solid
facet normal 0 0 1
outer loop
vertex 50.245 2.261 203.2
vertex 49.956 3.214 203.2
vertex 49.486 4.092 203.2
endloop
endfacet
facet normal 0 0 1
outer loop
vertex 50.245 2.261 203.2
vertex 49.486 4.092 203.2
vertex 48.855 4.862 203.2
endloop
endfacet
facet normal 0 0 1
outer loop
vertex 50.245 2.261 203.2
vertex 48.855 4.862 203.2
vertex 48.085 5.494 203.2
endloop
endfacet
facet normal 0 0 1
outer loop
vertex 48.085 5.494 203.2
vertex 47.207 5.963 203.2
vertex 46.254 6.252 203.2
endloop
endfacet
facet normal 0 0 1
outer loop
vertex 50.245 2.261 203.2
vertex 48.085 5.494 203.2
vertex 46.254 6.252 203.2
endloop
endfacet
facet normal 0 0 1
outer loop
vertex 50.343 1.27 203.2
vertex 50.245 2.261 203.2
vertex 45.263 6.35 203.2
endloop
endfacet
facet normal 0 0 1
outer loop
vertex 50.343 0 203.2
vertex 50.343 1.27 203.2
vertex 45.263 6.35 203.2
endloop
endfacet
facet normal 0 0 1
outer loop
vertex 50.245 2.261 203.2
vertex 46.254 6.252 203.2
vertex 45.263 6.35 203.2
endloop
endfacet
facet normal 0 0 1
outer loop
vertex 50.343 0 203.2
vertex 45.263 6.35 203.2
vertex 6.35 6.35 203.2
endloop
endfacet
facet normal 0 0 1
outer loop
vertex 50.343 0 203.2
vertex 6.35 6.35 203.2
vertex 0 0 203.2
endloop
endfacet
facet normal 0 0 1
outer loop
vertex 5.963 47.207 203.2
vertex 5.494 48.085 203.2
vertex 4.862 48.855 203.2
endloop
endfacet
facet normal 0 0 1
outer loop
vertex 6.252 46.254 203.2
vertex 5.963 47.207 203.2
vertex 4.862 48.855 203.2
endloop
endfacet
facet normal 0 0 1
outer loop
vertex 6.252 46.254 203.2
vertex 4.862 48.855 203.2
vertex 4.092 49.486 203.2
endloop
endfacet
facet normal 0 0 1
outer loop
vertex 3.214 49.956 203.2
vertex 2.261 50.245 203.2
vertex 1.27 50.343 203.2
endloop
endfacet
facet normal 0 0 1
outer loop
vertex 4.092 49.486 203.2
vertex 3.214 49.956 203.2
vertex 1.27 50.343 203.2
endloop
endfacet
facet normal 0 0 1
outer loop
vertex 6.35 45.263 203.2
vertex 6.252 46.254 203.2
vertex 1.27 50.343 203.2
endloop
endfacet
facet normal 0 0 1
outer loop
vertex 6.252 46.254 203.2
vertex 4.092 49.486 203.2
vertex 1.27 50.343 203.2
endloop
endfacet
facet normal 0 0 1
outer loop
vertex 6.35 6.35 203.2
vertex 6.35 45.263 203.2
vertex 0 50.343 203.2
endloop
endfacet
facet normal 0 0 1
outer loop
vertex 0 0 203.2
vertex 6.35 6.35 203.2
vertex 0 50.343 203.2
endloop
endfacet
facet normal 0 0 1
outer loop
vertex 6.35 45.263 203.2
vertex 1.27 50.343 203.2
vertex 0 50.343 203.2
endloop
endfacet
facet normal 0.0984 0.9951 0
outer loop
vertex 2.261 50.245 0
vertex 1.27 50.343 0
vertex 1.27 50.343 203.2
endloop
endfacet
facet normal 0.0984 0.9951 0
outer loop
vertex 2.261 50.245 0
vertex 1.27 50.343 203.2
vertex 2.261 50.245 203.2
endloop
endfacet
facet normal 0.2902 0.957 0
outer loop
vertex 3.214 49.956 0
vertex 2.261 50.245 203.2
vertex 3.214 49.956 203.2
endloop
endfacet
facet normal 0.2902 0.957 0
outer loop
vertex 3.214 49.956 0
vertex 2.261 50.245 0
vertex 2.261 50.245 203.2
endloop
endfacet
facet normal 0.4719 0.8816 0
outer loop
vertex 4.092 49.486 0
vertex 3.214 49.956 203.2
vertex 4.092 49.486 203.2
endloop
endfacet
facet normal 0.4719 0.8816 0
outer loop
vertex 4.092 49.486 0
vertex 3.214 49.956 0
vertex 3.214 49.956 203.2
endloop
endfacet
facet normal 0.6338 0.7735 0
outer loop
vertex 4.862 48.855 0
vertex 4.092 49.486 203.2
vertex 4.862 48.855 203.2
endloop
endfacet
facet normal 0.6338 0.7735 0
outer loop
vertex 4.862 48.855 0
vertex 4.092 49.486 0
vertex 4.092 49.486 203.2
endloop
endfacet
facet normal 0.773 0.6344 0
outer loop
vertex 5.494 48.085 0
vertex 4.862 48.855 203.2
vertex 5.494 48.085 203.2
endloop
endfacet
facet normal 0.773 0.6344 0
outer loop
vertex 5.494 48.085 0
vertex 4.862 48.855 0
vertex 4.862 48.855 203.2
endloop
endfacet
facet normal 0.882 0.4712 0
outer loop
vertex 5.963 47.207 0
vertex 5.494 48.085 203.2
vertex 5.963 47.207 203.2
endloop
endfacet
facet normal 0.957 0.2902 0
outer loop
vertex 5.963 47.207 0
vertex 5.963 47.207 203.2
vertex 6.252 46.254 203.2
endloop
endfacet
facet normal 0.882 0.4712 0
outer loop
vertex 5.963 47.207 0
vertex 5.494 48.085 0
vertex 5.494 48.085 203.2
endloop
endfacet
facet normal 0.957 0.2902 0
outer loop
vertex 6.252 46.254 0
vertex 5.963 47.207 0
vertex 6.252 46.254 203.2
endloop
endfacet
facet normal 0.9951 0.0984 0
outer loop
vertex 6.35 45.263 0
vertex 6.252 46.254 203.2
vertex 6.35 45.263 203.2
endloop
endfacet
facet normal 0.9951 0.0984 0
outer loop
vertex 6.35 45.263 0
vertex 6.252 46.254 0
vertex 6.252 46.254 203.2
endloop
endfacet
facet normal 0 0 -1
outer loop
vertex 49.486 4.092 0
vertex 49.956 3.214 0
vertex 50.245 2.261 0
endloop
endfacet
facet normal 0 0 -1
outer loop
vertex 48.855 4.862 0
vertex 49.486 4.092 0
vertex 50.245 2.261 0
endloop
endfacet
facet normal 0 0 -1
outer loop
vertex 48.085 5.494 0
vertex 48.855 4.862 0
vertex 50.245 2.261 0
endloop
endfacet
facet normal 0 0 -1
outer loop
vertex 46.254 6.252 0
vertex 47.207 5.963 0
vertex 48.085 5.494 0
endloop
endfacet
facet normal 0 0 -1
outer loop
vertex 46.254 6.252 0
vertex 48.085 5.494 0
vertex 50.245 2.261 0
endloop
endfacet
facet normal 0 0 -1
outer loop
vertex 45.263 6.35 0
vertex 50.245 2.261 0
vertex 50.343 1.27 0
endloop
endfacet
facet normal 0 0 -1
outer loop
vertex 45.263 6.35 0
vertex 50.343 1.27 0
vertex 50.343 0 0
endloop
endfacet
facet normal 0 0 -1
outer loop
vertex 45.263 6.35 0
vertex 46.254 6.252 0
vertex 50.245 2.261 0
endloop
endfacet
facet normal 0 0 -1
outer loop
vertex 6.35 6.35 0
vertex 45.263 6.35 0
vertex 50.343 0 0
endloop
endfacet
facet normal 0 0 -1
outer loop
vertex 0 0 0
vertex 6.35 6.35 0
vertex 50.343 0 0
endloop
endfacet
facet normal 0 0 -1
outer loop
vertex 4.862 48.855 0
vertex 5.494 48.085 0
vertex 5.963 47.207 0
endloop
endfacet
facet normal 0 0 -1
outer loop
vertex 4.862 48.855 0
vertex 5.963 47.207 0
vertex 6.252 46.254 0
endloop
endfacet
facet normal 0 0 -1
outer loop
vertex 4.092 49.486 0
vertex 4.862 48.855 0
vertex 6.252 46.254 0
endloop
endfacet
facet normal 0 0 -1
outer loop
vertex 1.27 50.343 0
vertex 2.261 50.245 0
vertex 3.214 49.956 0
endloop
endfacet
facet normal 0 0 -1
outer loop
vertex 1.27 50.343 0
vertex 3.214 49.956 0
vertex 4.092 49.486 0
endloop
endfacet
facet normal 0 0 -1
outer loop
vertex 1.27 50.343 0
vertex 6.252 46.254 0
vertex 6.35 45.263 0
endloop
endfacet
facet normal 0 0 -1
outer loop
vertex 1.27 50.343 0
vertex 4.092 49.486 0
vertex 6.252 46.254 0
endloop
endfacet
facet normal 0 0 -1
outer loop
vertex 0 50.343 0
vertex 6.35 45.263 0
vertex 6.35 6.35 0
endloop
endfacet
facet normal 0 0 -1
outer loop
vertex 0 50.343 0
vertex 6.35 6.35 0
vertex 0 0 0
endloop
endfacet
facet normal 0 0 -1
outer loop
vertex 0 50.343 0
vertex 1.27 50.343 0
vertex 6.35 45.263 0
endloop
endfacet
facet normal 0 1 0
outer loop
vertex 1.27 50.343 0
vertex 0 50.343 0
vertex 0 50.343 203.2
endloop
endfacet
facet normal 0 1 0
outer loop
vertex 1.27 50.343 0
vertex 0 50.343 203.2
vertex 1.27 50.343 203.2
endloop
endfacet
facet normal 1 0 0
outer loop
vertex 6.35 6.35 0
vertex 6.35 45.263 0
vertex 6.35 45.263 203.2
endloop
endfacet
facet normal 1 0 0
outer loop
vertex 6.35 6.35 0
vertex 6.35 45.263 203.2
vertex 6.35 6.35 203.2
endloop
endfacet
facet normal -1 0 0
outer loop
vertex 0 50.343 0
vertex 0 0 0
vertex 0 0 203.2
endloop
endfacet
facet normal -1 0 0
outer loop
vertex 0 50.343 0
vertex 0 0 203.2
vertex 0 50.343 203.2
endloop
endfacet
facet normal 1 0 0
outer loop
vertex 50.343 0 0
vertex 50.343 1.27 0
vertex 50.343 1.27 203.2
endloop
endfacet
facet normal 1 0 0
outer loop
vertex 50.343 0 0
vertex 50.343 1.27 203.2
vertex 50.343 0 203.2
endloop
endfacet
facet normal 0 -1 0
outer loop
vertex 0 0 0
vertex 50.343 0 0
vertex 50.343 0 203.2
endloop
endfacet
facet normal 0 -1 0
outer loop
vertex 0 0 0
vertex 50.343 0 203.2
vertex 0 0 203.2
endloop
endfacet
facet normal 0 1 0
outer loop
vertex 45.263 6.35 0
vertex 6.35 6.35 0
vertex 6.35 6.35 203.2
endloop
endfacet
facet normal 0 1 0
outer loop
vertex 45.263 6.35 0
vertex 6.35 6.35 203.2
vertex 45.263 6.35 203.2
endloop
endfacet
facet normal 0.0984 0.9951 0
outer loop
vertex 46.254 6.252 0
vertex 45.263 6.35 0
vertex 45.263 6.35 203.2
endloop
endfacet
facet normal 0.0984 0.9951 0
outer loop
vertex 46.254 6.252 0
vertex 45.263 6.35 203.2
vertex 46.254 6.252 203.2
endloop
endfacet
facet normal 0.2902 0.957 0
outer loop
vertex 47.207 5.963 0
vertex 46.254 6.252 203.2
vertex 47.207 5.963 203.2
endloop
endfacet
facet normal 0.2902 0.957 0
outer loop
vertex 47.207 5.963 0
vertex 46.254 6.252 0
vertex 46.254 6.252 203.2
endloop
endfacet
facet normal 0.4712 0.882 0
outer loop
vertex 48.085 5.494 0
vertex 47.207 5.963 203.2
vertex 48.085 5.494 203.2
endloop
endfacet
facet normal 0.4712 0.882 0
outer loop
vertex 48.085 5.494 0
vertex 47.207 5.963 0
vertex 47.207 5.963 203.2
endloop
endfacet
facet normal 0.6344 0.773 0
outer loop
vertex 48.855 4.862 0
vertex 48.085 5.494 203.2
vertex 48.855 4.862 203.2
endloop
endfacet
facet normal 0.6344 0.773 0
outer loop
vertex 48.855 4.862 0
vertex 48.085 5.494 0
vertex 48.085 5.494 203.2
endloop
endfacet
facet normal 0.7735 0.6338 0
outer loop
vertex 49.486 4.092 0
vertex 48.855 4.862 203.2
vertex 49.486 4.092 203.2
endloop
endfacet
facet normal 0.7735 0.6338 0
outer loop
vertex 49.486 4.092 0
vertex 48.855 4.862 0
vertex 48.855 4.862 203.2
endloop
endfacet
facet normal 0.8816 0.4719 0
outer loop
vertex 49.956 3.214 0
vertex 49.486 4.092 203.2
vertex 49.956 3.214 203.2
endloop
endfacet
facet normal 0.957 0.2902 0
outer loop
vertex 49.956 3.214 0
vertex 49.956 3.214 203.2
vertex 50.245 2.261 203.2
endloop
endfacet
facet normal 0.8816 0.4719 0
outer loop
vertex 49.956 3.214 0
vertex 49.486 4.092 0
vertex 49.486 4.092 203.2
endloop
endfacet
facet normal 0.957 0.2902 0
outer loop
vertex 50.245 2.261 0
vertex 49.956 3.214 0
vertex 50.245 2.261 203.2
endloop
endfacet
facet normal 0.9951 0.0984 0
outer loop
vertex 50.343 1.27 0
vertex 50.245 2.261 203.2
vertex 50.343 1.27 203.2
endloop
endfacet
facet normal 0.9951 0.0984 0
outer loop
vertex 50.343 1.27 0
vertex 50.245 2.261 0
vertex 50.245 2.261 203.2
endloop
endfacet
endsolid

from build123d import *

# Parameters (mm, degrees)
BOSS_EXTRUDE1_DEPTH = 203.2


with BuildPart() as part:
    # Sketch1 → Boss-Extrude1 (new body)
    with BuildSketch(Plane.XY):
        with BuildLine():
            ThreePointArc((1.27, 50.342576275), (4.862102448, 48.854678723), (6.35, 45.262576275))
            Line((6.35, 45.262576275), (6.35, 6.35))
            Line((6.35, 6.35), (45.262576275, 6.35))
            ThreePointArc((45.262576275, 6.35), (48.854678723, 4.862102448), (50.342576275, 1.27))
            Line((50.342576275, 1.27), (50.342576275, 0))
            Line((50.342576275, 0), (0, 0))
            Line((0, 0), (0, 50.342576275))
            Line((0, 50.342576275), (1.27, 50.342576275))
        make_face()
    extrude(amount=BOSS_EXTRUDE1_DEPTH)


solid = part.part
